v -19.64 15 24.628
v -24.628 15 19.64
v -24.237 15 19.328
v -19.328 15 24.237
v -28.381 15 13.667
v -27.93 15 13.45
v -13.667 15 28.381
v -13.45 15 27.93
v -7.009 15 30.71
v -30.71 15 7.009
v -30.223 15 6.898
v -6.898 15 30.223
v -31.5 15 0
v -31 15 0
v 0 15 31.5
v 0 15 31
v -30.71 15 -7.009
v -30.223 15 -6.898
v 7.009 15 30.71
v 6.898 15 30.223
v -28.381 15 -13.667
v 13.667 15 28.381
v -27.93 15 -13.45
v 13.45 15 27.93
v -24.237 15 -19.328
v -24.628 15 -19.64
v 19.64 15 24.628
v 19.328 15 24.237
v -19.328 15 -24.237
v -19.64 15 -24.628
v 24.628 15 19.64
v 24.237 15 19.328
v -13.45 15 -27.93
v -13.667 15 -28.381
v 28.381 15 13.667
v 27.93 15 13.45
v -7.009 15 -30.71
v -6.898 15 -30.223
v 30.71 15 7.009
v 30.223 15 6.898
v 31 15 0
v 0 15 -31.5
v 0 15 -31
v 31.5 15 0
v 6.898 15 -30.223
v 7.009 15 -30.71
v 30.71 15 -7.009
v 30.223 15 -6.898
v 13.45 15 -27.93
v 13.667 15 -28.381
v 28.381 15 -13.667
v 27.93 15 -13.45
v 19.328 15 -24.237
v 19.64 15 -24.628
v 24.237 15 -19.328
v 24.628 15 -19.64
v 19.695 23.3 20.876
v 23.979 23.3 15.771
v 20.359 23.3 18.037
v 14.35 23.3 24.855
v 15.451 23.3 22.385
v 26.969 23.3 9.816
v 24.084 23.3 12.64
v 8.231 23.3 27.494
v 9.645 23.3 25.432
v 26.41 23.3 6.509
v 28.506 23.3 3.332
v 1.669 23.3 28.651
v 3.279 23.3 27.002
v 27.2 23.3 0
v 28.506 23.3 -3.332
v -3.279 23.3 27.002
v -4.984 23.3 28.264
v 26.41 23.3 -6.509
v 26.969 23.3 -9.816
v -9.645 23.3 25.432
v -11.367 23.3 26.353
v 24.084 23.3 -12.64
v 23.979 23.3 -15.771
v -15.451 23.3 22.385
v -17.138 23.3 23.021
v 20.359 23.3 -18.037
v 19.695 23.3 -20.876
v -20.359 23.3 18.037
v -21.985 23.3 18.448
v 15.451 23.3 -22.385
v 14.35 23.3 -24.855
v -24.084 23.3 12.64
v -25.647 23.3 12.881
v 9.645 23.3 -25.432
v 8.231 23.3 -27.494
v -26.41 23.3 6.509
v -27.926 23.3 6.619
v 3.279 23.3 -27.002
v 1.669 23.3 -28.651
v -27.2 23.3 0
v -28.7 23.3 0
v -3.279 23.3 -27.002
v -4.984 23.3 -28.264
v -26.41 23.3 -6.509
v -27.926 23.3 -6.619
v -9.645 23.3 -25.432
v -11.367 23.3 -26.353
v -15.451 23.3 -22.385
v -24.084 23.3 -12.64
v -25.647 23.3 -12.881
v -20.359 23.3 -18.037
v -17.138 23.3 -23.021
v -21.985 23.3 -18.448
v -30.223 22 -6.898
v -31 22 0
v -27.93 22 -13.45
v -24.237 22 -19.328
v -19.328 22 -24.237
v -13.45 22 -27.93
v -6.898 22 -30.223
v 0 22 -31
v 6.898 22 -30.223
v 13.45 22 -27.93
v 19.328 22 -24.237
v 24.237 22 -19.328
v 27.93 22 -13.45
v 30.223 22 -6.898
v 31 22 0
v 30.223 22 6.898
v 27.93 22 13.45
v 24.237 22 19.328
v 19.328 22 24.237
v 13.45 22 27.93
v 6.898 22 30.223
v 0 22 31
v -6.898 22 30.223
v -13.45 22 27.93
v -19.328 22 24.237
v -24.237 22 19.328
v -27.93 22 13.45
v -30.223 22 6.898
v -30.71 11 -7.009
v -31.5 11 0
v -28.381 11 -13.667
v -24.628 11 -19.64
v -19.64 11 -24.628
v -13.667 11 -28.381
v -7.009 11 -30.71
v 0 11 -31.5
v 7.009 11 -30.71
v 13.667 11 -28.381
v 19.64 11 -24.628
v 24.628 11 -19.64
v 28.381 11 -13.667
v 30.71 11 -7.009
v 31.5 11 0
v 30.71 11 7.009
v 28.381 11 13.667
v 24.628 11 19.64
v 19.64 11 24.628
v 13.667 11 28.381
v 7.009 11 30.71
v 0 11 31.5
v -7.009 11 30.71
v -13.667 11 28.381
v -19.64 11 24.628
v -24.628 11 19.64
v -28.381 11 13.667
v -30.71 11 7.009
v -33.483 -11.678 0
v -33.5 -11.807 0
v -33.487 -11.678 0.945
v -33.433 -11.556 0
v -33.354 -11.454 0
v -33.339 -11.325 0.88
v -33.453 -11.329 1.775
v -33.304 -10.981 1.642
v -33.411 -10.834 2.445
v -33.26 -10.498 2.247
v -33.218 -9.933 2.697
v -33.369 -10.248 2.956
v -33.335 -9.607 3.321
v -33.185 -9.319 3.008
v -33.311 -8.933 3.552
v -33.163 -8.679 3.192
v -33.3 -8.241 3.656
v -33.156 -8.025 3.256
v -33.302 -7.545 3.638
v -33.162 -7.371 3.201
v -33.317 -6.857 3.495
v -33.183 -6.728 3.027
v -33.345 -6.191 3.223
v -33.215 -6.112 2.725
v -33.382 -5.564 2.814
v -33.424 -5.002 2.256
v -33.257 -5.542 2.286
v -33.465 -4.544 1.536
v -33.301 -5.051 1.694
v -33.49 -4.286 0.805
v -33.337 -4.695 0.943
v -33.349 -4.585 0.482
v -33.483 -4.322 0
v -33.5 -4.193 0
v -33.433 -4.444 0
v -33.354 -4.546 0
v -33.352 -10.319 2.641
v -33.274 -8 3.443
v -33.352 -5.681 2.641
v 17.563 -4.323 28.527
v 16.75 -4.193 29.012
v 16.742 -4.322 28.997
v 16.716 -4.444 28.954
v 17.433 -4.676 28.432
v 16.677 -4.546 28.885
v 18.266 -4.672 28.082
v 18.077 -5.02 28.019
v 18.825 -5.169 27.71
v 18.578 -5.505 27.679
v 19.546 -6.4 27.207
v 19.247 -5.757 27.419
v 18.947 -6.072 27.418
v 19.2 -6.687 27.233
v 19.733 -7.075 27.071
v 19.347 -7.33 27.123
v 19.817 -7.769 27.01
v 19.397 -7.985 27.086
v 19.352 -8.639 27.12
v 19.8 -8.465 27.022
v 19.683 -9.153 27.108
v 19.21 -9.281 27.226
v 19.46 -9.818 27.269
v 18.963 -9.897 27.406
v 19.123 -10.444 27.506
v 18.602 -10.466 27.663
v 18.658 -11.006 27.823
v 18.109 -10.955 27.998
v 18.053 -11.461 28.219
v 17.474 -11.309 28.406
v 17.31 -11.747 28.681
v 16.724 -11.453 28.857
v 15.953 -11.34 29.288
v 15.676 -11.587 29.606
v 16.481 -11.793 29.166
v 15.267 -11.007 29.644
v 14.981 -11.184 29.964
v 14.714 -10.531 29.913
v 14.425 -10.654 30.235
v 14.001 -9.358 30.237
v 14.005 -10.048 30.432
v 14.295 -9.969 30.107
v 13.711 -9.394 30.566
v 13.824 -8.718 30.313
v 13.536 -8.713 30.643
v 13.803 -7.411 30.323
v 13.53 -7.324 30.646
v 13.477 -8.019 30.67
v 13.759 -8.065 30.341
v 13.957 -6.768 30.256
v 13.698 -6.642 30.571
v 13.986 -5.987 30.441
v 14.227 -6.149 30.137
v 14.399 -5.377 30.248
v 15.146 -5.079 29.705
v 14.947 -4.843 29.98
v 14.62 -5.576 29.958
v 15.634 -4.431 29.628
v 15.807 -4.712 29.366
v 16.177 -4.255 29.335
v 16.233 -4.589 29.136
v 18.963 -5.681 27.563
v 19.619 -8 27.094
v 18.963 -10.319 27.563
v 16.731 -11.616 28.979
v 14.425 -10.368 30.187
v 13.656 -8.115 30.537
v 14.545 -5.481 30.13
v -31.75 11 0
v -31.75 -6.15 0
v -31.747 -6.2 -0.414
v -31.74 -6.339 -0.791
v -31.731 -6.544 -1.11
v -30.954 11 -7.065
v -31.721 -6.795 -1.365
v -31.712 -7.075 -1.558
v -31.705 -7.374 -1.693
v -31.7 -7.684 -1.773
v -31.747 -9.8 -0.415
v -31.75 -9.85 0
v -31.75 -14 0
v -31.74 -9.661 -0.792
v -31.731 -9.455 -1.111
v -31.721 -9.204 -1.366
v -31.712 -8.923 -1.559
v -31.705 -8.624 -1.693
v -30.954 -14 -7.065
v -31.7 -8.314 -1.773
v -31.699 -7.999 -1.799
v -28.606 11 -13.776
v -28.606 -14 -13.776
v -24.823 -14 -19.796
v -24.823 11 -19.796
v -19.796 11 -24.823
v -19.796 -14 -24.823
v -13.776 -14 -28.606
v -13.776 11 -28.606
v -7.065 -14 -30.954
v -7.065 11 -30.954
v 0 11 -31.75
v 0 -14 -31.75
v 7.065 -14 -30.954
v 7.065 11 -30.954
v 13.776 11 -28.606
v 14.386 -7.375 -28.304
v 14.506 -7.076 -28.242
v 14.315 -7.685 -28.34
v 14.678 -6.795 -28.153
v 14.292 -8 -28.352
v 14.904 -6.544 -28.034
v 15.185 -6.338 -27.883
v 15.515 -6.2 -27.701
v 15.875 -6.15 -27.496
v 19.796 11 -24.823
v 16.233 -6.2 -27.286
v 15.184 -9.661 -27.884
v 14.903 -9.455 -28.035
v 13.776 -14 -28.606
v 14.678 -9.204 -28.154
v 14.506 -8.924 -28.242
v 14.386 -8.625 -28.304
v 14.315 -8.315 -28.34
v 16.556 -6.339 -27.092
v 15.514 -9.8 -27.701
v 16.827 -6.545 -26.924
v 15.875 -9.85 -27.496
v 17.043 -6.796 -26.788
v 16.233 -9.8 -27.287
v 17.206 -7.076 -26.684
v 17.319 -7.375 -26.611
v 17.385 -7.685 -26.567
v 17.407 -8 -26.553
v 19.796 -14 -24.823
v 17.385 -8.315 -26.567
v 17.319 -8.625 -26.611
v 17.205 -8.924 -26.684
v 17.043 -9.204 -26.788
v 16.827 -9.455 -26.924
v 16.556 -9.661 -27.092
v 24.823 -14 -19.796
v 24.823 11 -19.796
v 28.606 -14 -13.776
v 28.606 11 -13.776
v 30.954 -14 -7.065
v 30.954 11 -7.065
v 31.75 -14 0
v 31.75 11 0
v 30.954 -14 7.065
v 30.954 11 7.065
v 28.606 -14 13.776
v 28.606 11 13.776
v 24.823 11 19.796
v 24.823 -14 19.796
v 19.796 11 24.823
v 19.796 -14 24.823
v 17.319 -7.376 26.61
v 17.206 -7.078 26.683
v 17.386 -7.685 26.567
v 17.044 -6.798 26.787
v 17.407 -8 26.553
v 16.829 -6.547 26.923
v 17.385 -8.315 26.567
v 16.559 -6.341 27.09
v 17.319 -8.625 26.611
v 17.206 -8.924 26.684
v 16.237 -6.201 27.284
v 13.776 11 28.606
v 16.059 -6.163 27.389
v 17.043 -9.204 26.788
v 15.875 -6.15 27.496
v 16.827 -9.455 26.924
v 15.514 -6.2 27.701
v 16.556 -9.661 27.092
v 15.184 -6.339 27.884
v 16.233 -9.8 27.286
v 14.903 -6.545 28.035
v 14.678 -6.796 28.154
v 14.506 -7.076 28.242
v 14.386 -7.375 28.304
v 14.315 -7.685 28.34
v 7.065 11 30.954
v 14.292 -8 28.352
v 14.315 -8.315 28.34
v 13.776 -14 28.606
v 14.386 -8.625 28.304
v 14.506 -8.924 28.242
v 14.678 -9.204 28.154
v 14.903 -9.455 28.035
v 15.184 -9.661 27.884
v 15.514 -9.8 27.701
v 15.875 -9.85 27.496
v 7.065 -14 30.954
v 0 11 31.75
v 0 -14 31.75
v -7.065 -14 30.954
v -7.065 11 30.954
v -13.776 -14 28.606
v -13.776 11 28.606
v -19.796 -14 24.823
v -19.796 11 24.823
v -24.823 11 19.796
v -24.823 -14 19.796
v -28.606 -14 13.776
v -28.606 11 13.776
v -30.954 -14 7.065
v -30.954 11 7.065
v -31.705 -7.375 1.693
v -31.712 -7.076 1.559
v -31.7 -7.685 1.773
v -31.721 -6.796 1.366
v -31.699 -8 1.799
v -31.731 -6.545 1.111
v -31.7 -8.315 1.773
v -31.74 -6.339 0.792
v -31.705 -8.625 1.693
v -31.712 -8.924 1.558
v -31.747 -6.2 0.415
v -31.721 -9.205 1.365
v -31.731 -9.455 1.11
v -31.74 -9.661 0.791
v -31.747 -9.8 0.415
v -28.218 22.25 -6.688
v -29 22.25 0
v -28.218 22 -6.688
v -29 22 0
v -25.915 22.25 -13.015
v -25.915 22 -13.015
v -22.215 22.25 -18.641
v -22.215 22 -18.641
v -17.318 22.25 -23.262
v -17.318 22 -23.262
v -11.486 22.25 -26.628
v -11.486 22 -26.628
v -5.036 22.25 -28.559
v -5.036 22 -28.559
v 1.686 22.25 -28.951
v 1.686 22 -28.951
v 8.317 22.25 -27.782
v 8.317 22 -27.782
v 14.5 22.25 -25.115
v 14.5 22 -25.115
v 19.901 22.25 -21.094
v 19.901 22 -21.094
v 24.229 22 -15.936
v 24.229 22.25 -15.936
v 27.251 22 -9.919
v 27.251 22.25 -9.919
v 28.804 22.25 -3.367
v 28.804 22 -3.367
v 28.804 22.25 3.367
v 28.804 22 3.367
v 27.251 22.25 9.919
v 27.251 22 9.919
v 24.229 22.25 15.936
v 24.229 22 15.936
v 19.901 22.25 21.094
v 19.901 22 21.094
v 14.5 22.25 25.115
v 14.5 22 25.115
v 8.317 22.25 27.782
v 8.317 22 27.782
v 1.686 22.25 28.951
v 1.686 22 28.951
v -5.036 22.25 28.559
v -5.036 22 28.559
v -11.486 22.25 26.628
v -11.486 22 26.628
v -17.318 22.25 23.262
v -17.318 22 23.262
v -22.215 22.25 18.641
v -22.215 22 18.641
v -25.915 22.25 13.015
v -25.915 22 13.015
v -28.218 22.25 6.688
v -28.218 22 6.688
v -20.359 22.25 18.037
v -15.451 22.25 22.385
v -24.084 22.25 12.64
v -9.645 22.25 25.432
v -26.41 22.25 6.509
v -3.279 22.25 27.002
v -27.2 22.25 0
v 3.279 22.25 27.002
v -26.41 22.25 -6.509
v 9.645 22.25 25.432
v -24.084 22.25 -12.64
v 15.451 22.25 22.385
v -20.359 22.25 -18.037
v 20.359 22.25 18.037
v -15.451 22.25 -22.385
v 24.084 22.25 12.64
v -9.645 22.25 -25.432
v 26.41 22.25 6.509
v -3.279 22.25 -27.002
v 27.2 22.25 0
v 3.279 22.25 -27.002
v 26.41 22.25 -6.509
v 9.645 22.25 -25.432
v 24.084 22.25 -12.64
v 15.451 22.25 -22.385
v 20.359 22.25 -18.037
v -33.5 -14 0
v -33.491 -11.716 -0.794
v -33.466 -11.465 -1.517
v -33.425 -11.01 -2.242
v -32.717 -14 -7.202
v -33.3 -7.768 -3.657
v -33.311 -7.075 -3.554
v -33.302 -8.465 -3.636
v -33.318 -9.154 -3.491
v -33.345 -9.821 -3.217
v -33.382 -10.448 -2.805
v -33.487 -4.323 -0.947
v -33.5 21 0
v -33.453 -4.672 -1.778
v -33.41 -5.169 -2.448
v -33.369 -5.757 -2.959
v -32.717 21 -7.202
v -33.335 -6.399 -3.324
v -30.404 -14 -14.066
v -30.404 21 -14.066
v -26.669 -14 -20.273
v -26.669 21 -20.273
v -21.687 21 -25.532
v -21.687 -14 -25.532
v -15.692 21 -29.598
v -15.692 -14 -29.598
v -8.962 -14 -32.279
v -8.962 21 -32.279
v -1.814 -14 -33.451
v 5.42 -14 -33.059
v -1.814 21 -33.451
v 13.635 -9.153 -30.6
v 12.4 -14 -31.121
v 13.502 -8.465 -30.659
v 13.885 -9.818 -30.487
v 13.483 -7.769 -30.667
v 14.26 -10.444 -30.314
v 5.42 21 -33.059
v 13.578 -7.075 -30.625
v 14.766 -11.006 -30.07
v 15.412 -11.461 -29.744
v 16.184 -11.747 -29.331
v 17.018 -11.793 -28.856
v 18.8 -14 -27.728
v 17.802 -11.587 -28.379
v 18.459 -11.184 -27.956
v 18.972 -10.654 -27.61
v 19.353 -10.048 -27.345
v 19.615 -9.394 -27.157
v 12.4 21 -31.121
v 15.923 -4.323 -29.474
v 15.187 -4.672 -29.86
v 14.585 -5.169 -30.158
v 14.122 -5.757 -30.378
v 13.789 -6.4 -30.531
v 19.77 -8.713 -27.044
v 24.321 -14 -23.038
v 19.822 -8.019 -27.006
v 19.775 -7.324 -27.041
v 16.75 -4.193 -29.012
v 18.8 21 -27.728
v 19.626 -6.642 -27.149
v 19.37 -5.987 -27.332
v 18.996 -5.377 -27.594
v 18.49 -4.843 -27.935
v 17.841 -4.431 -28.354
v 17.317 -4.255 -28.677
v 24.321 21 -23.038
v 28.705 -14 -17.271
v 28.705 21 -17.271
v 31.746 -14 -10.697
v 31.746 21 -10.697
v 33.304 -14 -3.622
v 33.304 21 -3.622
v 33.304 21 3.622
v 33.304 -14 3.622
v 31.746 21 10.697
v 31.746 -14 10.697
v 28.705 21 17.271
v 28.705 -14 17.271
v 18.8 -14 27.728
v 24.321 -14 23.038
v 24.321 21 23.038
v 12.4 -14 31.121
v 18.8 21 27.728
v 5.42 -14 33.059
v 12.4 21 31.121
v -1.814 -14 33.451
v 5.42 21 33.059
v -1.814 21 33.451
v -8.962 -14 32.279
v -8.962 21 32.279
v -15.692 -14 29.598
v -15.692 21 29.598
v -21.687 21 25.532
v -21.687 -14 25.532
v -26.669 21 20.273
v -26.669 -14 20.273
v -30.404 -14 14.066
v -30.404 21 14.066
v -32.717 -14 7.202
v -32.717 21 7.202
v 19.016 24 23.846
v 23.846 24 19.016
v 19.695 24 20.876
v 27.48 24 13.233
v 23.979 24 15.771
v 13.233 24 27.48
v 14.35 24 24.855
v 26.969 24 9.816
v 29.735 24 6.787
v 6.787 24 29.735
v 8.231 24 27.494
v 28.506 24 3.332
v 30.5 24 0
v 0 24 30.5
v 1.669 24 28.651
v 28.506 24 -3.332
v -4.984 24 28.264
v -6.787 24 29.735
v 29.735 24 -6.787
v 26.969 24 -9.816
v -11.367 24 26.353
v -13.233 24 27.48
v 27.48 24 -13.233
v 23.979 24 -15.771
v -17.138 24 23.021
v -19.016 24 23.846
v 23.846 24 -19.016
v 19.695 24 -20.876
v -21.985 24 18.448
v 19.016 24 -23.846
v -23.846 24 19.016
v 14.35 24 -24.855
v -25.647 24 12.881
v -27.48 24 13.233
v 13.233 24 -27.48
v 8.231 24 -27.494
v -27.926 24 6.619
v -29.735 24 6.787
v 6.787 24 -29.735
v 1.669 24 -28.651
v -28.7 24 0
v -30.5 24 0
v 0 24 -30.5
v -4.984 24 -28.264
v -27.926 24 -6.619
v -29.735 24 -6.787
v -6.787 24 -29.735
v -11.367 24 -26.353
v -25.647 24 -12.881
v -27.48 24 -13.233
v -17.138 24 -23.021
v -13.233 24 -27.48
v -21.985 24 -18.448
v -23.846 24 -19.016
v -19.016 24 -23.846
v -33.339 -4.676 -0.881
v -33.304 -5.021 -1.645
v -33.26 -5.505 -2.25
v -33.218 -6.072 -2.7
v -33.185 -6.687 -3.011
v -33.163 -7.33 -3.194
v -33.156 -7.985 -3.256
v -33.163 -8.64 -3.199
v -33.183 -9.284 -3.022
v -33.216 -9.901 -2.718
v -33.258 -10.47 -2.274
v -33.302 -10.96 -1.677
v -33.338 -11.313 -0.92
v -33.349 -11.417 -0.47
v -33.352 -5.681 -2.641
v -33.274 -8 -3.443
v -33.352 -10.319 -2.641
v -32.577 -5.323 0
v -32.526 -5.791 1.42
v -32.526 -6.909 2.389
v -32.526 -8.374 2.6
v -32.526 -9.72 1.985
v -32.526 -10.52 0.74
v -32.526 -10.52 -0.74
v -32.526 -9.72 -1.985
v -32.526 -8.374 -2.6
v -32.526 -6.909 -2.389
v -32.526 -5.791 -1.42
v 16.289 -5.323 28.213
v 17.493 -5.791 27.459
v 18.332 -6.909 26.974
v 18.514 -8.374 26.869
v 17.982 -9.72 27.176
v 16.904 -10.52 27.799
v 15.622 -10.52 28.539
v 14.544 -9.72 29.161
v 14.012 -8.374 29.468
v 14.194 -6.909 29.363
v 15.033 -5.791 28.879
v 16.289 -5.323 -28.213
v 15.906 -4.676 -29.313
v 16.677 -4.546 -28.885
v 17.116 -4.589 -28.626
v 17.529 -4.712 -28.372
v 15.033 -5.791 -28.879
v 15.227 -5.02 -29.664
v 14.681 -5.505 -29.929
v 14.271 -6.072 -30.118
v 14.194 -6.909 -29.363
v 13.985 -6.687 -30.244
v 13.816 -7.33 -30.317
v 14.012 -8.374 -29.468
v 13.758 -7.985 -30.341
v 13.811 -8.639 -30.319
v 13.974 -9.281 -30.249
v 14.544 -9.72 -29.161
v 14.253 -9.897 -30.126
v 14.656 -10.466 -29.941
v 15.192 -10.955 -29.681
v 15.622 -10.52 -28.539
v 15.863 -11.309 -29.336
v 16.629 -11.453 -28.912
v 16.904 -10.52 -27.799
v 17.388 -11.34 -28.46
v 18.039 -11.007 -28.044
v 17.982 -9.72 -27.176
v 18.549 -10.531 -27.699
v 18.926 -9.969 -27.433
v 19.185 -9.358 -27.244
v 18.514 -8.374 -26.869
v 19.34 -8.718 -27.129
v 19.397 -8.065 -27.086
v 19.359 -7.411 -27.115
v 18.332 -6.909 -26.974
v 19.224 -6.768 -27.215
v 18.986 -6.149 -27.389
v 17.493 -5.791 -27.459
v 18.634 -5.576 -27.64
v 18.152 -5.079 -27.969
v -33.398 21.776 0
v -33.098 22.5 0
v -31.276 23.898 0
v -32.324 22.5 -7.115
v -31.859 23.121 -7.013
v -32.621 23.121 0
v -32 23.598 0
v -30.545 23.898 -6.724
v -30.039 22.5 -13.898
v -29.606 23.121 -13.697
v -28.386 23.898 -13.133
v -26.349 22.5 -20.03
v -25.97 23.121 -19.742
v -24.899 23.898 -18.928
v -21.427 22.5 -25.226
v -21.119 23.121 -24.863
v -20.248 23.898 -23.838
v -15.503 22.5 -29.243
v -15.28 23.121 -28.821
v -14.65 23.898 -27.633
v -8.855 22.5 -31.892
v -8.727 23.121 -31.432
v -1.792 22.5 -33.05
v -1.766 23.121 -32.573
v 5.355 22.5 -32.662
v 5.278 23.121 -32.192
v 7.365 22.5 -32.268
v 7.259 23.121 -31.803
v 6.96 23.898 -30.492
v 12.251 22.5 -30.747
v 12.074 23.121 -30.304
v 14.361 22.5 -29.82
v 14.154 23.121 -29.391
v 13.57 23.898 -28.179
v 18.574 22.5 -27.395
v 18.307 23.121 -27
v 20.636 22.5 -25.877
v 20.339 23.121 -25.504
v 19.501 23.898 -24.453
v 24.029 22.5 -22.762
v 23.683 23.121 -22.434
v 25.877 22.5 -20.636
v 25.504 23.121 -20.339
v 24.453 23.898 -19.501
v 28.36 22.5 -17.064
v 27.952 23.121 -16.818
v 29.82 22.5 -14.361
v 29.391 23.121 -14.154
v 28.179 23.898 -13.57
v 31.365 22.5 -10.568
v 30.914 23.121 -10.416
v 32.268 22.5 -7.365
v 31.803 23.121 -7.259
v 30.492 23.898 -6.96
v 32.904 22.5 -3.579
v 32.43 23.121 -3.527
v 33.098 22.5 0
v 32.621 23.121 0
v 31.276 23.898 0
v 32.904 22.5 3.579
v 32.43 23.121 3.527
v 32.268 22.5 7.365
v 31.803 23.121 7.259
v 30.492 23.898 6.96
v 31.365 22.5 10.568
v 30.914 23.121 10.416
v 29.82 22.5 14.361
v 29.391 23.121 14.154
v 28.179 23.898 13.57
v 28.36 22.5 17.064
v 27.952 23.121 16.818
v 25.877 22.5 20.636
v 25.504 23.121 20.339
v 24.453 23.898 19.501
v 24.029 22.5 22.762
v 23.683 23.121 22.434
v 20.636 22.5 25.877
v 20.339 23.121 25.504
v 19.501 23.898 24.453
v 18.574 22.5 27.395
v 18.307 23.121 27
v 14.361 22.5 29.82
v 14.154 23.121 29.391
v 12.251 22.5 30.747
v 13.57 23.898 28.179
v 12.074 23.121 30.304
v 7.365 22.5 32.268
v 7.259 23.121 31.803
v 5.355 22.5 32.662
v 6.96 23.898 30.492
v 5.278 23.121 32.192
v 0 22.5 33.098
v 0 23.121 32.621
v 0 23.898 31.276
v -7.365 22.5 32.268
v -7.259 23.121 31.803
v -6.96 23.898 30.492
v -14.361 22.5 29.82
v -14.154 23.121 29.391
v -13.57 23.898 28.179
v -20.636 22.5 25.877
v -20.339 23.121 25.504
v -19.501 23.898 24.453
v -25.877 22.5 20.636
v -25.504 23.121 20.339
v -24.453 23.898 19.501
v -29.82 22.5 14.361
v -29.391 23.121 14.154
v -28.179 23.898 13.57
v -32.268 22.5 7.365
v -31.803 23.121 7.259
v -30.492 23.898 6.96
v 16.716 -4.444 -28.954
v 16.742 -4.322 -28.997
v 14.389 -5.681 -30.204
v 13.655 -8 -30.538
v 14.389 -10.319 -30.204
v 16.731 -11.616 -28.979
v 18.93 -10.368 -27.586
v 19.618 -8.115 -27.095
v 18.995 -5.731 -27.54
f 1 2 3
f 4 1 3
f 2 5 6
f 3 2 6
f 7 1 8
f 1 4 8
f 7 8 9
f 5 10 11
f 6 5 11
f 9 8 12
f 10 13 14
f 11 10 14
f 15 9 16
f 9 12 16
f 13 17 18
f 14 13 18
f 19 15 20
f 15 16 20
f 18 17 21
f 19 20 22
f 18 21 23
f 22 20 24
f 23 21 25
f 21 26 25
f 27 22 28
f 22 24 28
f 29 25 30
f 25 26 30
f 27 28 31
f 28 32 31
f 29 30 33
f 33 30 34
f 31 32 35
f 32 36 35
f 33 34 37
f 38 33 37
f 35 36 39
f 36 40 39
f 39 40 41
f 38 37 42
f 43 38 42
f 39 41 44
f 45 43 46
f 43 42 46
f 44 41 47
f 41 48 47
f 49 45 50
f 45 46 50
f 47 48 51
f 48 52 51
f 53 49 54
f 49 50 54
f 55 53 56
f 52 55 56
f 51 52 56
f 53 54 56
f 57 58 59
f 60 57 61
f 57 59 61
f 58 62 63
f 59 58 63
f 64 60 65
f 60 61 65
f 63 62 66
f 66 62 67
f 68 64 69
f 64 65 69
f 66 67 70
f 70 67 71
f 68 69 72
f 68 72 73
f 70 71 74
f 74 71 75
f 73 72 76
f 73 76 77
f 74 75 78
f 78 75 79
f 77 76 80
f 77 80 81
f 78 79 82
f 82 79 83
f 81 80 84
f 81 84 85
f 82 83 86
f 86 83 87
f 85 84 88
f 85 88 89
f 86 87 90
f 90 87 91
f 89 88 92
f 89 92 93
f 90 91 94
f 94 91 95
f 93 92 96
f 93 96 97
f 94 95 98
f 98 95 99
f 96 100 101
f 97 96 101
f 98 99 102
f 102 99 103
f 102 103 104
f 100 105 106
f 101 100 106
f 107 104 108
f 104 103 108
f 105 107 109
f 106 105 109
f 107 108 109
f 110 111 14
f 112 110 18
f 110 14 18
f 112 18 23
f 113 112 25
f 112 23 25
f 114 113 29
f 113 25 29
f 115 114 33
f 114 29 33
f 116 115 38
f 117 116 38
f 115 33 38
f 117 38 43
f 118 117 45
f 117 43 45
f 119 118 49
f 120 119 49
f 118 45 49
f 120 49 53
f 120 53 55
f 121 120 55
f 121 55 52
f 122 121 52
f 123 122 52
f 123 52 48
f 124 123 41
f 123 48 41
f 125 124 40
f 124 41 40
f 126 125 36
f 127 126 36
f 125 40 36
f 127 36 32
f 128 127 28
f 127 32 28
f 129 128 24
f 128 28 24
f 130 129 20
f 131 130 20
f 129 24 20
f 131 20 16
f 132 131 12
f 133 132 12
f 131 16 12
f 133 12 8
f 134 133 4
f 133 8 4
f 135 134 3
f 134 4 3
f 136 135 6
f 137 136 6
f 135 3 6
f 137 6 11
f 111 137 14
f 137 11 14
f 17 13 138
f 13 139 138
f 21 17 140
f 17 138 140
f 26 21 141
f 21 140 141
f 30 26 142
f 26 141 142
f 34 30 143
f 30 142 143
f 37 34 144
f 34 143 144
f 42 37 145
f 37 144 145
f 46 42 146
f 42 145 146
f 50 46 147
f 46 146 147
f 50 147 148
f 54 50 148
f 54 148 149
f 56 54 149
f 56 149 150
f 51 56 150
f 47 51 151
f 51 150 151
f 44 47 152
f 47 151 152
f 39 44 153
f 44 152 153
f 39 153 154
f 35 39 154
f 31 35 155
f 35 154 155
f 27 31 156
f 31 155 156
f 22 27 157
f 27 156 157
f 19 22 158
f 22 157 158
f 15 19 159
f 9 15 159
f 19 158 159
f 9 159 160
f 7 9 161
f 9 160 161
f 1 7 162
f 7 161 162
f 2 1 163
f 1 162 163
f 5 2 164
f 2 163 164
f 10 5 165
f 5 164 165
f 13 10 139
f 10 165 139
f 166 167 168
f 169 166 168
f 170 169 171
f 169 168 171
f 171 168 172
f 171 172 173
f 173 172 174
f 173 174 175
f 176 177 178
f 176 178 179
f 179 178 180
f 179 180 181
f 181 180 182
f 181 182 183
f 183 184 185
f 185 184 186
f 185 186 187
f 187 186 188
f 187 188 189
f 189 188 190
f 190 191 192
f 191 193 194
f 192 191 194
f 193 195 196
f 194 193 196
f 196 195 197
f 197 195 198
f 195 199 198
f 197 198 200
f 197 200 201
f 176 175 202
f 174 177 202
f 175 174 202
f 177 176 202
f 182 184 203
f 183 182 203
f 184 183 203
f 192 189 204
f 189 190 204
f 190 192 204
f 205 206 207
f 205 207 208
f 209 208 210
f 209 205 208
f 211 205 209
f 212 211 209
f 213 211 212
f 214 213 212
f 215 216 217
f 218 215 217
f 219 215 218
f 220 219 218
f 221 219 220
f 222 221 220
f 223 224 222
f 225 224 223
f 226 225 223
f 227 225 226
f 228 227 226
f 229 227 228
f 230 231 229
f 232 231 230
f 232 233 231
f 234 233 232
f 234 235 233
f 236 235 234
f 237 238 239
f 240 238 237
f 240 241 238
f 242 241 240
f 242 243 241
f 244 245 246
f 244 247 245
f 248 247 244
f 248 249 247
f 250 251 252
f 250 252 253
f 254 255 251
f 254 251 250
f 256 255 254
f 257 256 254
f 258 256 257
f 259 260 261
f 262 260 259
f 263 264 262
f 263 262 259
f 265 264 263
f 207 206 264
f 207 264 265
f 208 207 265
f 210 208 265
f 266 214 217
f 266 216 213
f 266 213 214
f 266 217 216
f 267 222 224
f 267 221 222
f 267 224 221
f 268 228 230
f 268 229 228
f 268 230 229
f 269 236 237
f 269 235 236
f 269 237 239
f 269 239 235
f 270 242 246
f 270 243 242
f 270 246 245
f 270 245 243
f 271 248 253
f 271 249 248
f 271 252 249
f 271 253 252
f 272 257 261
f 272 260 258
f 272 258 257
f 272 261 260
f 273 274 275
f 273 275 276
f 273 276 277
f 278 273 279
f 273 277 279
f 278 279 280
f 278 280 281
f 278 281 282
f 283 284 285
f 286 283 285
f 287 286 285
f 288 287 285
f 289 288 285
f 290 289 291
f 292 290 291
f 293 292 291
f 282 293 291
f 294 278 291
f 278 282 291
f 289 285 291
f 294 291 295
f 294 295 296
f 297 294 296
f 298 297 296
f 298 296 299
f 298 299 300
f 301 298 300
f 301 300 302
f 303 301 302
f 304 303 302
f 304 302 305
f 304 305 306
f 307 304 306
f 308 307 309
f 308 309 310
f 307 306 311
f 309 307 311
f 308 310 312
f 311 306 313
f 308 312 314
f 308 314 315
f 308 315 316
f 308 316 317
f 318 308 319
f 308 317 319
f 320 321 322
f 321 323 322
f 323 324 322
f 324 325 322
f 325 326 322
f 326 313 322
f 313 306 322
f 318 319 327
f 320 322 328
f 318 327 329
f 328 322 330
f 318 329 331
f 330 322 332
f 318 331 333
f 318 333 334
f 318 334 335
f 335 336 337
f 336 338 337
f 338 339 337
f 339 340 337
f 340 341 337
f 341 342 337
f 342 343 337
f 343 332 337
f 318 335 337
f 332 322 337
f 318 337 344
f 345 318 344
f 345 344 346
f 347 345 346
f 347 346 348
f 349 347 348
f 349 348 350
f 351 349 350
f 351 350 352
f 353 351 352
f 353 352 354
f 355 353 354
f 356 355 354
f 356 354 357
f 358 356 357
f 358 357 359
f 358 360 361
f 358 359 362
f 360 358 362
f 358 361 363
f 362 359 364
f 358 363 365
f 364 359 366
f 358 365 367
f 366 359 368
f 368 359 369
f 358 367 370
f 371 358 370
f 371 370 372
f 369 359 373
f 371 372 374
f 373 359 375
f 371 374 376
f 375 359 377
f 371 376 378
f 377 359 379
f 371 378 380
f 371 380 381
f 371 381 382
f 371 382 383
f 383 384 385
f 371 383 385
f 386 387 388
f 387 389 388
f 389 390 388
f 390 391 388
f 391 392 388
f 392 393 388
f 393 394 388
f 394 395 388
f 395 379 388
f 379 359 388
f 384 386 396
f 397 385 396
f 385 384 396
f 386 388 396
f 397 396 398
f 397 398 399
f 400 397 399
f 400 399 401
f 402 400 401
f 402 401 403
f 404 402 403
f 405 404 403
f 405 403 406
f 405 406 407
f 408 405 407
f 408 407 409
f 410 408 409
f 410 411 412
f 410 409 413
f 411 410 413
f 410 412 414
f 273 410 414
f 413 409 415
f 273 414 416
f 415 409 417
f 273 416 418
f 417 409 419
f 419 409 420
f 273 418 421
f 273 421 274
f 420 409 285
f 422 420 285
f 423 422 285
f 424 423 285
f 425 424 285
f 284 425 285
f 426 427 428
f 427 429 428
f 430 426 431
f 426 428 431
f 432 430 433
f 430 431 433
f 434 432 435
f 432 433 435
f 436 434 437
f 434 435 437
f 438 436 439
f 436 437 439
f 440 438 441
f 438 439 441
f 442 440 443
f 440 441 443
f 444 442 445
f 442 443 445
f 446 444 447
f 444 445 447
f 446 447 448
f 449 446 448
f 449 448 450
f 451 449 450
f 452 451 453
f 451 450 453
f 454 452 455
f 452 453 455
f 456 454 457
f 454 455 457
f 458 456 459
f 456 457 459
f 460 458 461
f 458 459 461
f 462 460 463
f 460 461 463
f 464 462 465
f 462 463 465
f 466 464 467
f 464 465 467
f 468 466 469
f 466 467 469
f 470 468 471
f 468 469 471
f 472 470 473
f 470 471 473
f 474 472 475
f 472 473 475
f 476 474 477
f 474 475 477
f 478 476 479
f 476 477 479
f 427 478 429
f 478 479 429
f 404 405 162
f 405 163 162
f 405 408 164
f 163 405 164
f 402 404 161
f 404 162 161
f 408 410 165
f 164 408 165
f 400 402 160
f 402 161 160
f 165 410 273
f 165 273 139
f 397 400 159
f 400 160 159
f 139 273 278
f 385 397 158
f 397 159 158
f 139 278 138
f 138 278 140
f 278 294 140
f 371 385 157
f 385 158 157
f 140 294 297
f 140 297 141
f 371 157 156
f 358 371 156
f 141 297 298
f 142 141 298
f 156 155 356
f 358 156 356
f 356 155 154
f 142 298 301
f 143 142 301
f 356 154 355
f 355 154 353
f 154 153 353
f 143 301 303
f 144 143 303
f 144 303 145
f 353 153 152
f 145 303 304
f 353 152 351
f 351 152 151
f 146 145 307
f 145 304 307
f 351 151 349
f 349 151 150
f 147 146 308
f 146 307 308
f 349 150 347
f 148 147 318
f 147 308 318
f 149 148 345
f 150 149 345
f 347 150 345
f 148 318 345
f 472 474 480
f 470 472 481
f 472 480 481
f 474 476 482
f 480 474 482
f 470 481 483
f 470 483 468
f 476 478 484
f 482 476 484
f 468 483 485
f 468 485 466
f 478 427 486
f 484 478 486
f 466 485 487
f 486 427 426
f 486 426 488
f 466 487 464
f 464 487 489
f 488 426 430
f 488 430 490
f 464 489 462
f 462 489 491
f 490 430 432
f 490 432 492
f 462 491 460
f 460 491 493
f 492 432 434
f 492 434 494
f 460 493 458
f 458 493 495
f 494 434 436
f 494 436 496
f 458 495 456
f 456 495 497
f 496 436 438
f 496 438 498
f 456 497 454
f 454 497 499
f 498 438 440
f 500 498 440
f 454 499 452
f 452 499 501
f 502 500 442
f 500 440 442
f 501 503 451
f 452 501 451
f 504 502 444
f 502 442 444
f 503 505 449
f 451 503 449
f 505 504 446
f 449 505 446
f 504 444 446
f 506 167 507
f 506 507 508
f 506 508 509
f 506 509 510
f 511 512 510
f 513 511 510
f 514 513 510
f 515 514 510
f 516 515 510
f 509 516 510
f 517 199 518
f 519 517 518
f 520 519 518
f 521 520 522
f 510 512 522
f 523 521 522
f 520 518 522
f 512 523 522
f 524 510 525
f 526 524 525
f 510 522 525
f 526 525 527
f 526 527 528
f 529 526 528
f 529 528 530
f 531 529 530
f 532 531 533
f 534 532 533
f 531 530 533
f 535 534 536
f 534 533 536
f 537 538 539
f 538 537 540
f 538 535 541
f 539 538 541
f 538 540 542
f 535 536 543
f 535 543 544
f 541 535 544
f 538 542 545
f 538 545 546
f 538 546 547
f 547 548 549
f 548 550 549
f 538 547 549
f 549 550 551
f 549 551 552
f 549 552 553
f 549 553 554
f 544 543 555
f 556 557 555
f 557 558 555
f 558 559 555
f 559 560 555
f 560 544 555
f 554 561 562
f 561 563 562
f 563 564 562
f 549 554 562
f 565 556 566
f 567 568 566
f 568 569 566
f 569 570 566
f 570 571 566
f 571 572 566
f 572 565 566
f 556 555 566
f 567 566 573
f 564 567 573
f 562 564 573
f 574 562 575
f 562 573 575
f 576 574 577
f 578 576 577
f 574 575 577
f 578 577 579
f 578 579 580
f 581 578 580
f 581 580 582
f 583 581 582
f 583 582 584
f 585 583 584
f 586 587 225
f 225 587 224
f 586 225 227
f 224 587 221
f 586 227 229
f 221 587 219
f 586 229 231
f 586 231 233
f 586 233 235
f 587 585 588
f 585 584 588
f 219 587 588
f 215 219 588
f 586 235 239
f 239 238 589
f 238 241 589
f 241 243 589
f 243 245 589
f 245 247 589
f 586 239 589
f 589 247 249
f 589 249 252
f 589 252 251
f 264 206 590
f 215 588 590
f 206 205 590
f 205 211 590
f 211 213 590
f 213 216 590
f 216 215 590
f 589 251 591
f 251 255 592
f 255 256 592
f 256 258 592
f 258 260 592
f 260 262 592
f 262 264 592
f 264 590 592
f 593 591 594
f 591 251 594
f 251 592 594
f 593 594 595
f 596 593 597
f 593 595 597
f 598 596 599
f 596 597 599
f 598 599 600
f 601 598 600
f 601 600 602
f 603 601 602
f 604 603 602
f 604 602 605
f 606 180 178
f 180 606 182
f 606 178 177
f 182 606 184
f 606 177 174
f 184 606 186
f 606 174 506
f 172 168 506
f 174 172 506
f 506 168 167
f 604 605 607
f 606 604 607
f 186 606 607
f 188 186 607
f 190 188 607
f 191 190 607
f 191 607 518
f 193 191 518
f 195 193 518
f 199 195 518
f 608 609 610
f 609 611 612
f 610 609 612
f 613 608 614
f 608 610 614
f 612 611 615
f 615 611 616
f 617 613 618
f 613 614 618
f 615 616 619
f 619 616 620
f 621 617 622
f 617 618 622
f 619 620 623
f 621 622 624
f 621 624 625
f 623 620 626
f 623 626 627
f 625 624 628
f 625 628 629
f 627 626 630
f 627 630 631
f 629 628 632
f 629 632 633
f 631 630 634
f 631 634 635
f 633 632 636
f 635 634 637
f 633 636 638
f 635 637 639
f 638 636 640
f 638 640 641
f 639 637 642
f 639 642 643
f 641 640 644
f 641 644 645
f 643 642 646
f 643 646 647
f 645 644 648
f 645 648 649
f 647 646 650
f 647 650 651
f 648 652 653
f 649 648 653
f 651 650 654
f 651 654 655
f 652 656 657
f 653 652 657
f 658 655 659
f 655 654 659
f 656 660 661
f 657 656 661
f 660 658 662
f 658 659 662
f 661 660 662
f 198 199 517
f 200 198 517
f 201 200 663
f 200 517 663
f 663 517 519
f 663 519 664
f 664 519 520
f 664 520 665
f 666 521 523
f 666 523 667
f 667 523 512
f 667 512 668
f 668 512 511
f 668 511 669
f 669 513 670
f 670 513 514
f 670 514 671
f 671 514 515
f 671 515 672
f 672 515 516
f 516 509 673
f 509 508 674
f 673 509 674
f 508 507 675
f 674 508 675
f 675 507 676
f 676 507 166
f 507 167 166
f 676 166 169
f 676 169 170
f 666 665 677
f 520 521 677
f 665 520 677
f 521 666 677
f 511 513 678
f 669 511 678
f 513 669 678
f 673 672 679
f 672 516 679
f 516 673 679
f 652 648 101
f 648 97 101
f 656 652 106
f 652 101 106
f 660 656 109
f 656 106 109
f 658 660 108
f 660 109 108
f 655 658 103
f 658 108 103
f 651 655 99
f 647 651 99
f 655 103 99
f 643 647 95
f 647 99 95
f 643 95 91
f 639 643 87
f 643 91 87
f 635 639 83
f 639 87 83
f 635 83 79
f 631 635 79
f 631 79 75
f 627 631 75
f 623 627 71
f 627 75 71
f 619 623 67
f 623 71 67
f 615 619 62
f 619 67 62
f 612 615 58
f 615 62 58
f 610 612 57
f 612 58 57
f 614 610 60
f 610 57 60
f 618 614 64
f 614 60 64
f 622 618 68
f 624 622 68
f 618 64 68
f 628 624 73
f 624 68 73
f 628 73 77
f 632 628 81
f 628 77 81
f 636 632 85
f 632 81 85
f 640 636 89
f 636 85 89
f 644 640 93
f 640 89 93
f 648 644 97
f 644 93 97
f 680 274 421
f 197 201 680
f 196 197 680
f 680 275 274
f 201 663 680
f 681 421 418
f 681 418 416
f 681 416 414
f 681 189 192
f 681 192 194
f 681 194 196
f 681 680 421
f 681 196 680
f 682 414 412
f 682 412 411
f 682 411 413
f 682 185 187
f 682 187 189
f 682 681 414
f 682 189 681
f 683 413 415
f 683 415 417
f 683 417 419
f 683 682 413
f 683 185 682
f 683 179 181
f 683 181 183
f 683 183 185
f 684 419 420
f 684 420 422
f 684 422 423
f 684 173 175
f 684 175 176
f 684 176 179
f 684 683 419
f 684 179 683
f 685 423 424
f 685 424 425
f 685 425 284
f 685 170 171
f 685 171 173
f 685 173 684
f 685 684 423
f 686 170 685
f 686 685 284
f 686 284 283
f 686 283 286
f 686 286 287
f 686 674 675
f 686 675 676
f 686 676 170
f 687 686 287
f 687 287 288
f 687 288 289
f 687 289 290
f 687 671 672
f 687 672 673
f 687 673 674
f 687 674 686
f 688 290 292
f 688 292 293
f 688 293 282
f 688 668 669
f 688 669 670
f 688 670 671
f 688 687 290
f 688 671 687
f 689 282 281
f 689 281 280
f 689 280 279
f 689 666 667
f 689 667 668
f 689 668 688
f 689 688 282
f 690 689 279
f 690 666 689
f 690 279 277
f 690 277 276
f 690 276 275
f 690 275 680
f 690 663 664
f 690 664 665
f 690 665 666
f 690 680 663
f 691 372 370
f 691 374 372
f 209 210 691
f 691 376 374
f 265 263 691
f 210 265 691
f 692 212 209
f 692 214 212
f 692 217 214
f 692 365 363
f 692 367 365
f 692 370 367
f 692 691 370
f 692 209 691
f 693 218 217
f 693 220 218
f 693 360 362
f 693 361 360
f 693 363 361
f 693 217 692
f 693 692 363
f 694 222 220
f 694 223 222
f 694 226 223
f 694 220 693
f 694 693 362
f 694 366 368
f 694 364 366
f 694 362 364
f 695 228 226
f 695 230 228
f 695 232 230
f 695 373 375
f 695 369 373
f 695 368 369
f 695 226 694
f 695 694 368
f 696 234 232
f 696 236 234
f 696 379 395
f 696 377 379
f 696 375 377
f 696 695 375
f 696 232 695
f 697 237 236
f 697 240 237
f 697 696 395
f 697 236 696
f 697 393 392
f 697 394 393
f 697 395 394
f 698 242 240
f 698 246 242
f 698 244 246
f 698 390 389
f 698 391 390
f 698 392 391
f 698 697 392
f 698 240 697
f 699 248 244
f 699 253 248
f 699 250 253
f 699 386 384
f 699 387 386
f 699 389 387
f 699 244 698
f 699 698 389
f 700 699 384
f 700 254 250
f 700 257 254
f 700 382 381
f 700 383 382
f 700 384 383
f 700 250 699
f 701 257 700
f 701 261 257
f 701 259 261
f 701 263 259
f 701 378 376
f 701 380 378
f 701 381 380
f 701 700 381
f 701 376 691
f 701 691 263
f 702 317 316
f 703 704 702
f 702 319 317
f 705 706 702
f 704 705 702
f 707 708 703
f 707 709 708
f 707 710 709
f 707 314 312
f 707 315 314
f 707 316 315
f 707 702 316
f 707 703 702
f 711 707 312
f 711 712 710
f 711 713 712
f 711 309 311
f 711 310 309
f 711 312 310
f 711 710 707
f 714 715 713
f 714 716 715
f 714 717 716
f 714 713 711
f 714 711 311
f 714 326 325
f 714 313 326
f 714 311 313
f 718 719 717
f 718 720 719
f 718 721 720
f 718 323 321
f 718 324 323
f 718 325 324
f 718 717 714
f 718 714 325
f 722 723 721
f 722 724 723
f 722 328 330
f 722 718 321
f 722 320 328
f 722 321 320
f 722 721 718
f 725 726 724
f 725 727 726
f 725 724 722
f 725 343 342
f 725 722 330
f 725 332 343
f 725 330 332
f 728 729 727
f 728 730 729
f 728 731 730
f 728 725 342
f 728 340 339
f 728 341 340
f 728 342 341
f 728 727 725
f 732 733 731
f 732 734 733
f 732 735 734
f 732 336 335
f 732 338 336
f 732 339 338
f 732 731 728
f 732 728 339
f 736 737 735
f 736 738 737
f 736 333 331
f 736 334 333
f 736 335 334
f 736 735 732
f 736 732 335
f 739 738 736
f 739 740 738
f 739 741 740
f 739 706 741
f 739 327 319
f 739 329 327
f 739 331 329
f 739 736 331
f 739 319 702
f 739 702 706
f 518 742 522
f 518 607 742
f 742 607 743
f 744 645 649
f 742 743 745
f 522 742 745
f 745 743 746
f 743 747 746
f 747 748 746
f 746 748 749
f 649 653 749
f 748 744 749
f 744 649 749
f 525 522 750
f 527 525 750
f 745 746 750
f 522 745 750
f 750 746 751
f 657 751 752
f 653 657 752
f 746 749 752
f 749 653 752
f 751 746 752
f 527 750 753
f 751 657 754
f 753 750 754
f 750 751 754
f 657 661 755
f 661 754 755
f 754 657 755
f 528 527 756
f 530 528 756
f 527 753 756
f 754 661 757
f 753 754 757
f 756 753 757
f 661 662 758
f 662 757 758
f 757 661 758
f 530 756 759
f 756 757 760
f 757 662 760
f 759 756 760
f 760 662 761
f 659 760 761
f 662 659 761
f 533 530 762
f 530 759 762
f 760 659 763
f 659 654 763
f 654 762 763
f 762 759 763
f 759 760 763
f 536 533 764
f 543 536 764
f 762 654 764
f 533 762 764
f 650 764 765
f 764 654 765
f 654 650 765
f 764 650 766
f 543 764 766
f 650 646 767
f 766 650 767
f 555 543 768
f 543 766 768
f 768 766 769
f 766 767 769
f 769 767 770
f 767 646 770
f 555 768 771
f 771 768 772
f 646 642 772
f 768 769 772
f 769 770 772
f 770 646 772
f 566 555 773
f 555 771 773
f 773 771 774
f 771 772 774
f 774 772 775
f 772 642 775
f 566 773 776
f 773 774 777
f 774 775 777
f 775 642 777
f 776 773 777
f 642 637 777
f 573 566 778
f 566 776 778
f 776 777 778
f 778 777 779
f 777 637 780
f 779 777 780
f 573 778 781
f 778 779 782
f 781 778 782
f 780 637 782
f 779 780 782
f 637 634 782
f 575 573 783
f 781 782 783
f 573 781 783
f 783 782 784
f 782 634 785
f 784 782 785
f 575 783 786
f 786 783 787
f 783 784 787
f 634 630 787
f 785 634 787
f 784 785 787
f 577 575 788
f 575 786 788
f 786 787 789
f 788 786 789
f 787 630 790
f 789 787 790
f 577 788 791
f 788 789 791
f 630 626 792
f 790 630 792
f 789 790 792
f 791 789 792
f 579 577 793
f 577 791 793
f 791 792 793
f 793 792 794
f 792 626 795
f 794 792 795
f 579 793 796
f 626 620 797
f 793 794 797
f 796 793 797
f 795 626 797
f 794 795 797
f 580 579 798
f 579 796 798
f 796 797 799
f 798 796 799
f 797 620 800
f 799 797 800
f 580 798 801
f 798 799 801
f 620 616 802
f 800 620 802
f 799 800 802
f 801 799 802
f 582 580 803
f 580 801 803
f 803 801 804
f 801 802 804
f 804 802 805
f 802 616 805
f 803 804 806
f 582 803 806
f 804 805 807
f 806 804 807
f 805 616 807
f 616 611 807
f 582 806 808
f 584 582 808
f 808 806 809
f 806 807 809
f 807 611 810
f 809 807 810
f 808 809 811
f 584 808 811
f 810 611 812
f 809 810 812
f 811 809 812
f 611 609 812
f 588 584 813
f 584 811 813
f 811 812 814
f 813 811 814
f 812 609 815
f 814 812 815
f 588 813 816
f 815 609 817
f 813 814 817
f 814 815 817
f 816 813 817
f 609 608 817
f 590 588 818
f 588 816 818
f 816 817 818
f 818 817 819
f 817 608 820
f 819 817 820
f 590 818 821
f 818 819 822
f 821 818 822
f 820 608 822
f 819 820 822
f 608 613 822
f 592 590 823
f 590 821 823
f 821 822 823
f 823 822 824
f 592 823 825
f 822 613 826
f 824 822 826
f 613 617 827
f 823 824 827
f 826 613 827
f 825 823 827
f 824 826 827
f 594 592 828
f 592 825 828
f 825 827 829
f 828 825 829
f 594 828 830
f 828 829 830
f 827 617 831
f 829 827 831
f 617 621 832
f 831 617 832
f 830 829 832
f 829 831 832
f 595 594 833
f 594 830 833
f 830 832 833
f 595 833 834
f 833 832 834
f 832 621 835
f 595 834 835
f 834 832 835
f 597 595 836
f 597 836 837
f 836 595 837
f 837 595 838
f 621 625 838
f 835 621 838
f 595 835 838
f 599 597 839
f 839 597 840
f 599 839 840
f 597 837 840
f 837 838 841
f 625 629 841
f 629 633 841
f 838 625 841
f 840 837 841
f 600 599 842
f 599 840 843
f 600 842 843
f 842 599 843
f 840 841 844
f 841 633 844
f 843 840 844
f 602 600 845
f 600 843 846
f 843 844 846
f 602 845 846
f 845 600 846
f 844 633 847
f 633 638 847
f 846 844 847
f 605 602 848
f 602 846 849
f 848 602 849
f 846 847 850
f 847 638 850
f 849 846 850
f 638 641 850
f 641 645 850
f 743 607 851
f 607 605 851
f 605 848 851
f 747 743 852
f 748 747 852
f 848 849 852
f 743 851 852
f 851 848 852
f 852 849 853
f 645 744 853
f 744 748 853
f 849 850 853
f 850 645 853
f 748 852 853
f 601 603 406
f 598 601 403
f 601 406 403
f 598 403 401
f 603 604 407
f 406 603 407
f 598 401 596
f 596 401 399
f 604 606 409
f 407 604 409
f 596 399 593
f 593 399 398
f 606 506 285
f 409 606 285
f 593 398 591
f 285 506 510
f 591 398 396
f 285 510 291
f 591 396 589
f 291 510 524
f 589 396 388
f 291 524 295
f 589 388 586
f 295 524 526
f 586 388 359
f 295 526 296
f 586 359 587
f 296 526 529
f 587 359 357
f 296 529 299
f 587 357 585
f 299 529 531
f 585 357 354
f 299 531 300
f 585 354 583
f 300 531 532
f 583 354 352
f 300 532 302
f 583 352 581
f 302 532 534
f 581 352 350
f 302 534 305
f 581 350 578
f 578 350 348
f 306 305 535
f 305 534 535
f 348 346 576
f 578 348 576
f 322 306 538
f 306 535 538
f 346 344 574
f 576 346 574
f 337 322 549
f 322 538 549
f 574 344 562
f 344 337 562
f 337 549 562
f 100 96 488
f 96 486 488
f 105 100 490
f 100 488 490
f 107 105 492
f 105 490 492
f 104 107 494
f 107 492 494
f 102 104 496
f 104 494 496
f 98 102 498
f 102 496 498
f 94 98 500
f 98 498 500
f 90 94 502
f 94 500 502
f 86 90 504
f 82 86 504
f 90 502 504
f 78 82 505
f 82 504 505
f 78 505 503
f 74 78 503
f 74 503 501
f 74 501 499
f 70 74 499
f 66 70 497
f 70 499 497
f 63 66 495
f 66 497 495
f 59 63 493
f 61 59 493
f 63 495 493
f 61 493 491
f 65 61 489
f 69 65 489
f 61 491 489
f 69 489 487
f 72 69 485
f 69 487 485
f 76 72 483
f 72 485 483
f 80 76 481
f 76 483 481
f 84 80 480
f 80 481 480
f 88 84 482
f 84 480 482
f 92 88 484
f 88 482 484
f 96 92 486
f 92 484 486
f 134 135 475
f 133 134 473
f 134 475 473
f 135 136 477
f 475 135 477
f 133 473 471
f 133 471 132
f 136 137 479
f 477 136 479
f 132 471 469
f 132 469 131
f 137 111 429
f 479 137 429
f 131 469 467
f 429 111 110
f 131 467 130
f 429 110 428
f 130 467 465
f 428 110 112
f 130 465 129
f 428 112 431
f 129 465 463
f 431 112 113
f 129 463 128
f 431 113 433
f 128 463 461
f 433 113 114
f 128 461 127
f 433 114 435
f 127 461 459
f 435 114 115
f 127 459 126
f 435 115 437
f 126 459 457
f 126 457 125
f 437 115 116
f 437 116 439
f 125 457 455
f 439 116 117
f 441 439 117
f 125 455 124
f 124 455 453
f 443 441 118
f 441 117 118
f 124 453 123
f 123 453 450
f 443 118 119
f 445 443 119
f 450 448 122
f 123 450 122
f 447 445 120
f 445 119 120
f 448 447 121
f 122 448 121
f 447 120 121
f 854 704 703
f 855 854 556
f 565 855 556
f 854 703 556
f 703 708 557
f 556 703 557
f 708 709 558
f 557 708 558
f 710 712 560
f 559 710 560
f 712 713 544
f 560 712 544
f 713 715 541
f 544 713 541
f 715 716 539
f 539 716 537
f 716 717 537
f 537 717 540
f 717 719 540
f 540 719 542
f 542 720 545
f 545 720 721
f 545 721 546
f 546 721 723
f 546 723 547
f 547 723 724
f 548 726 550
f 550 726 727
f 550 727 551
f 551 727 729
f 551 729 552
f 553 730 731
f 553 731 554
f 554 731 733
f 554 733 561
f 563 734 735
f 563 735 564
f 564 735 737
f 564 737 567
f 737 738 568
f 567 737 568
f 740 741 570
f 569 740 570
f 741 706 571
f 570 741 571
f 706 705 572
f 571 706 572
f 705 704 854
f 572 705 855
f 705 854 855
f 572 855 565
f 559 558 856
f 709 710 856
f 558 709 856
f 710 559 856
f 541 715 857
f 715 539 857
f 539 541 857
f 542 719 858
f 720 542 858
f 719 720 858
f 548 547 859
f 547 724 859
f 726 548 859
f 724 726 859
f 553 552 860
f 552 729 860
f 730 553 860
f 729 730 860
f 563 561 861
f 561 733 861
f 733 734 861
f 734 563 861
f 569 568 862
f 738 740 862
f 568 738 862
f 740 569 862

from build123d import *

# Parameters (mm, degrees)
CIRPATTERN2_COUNT = 3
FILLET1_R         = 0.5


with BuildPart() as part:
    # Sketch1 → Revolve1 (revolve)
    with BuildSketch(Plane.XY):
        with BuildLine():
            Line((-27.2, 23.3), (-27.2, 22.25))
            Line((-27.2, 22.25), (-29, 22.25))
            Line((-29, 22.25), (-29, 22))
            Line((-29, 22), (-31, 22))
            Line((-31, 22), (-31, 15))
            Line((-31, 15), (-31.5, 15))
            Line((-31.5, 15), (-31.5, 11))
            Line((-31.5, 11), (-31.75, 11))
            Line((-31.75, 11), (-31.75, -14))
            Line((-31.75, -14), (-33.5, -14))
            Line((-33.5, -14), (-33.5, 21))
            ThreePointArc((-33.5, 21), (-32.621320344, 23.121320344), (-30.5, 24))
            Line((-30.5, 24), (-28.7, 24))
            Line((-28.7, 24), (-28.7, 23.3))
            Line((-28.7, 23.3), (-27.2, 23.3))
        make_face()
    revolve(axis=Axis((0, -0.222595104, 0), (0, -1, 0)))

    # Sketch4 → Cut-Revolve1 (revolve, cut)
    with BuildSketch(Plane.XY):
        Polygon((-33.5, -8), (-25.29746816, -8), (-25.29746816, -6.4), (-31.5, -6.4), (-33.5, -4.4), align=None)
    cut_revolve1 = revolve(axis=Axis((-29.768934642, -8, 0), (1, 0, 0)), mode=Mode.SUBTRACT)

    # CirPattern2: Cut-Revolve1 ×3 about axis
    cirpattern2_axis = Axis((0, 0, 0), (0, 1, 0))
    for i in range(1, CIRPATTERN2_COUNT):
        add(cut_revolve1.rotate(cirpattern2_axis, i * 360 / CIRPATTERN2_COUNT), mode=Mode.SUBTRACT)

    # Fillet1
    fillet1_edges = [part.edges().sort_by_distance(p)[0] for p in [
        (-33.324506796, -8, 3.424506796),
        (16.750000115, -11.6, 29.01185096),
        (16.749999851, -11.6, -29.011851113),
    ]]
    fillet(fillet1_edges, radius=FILLET1_R)


solid = part.part
